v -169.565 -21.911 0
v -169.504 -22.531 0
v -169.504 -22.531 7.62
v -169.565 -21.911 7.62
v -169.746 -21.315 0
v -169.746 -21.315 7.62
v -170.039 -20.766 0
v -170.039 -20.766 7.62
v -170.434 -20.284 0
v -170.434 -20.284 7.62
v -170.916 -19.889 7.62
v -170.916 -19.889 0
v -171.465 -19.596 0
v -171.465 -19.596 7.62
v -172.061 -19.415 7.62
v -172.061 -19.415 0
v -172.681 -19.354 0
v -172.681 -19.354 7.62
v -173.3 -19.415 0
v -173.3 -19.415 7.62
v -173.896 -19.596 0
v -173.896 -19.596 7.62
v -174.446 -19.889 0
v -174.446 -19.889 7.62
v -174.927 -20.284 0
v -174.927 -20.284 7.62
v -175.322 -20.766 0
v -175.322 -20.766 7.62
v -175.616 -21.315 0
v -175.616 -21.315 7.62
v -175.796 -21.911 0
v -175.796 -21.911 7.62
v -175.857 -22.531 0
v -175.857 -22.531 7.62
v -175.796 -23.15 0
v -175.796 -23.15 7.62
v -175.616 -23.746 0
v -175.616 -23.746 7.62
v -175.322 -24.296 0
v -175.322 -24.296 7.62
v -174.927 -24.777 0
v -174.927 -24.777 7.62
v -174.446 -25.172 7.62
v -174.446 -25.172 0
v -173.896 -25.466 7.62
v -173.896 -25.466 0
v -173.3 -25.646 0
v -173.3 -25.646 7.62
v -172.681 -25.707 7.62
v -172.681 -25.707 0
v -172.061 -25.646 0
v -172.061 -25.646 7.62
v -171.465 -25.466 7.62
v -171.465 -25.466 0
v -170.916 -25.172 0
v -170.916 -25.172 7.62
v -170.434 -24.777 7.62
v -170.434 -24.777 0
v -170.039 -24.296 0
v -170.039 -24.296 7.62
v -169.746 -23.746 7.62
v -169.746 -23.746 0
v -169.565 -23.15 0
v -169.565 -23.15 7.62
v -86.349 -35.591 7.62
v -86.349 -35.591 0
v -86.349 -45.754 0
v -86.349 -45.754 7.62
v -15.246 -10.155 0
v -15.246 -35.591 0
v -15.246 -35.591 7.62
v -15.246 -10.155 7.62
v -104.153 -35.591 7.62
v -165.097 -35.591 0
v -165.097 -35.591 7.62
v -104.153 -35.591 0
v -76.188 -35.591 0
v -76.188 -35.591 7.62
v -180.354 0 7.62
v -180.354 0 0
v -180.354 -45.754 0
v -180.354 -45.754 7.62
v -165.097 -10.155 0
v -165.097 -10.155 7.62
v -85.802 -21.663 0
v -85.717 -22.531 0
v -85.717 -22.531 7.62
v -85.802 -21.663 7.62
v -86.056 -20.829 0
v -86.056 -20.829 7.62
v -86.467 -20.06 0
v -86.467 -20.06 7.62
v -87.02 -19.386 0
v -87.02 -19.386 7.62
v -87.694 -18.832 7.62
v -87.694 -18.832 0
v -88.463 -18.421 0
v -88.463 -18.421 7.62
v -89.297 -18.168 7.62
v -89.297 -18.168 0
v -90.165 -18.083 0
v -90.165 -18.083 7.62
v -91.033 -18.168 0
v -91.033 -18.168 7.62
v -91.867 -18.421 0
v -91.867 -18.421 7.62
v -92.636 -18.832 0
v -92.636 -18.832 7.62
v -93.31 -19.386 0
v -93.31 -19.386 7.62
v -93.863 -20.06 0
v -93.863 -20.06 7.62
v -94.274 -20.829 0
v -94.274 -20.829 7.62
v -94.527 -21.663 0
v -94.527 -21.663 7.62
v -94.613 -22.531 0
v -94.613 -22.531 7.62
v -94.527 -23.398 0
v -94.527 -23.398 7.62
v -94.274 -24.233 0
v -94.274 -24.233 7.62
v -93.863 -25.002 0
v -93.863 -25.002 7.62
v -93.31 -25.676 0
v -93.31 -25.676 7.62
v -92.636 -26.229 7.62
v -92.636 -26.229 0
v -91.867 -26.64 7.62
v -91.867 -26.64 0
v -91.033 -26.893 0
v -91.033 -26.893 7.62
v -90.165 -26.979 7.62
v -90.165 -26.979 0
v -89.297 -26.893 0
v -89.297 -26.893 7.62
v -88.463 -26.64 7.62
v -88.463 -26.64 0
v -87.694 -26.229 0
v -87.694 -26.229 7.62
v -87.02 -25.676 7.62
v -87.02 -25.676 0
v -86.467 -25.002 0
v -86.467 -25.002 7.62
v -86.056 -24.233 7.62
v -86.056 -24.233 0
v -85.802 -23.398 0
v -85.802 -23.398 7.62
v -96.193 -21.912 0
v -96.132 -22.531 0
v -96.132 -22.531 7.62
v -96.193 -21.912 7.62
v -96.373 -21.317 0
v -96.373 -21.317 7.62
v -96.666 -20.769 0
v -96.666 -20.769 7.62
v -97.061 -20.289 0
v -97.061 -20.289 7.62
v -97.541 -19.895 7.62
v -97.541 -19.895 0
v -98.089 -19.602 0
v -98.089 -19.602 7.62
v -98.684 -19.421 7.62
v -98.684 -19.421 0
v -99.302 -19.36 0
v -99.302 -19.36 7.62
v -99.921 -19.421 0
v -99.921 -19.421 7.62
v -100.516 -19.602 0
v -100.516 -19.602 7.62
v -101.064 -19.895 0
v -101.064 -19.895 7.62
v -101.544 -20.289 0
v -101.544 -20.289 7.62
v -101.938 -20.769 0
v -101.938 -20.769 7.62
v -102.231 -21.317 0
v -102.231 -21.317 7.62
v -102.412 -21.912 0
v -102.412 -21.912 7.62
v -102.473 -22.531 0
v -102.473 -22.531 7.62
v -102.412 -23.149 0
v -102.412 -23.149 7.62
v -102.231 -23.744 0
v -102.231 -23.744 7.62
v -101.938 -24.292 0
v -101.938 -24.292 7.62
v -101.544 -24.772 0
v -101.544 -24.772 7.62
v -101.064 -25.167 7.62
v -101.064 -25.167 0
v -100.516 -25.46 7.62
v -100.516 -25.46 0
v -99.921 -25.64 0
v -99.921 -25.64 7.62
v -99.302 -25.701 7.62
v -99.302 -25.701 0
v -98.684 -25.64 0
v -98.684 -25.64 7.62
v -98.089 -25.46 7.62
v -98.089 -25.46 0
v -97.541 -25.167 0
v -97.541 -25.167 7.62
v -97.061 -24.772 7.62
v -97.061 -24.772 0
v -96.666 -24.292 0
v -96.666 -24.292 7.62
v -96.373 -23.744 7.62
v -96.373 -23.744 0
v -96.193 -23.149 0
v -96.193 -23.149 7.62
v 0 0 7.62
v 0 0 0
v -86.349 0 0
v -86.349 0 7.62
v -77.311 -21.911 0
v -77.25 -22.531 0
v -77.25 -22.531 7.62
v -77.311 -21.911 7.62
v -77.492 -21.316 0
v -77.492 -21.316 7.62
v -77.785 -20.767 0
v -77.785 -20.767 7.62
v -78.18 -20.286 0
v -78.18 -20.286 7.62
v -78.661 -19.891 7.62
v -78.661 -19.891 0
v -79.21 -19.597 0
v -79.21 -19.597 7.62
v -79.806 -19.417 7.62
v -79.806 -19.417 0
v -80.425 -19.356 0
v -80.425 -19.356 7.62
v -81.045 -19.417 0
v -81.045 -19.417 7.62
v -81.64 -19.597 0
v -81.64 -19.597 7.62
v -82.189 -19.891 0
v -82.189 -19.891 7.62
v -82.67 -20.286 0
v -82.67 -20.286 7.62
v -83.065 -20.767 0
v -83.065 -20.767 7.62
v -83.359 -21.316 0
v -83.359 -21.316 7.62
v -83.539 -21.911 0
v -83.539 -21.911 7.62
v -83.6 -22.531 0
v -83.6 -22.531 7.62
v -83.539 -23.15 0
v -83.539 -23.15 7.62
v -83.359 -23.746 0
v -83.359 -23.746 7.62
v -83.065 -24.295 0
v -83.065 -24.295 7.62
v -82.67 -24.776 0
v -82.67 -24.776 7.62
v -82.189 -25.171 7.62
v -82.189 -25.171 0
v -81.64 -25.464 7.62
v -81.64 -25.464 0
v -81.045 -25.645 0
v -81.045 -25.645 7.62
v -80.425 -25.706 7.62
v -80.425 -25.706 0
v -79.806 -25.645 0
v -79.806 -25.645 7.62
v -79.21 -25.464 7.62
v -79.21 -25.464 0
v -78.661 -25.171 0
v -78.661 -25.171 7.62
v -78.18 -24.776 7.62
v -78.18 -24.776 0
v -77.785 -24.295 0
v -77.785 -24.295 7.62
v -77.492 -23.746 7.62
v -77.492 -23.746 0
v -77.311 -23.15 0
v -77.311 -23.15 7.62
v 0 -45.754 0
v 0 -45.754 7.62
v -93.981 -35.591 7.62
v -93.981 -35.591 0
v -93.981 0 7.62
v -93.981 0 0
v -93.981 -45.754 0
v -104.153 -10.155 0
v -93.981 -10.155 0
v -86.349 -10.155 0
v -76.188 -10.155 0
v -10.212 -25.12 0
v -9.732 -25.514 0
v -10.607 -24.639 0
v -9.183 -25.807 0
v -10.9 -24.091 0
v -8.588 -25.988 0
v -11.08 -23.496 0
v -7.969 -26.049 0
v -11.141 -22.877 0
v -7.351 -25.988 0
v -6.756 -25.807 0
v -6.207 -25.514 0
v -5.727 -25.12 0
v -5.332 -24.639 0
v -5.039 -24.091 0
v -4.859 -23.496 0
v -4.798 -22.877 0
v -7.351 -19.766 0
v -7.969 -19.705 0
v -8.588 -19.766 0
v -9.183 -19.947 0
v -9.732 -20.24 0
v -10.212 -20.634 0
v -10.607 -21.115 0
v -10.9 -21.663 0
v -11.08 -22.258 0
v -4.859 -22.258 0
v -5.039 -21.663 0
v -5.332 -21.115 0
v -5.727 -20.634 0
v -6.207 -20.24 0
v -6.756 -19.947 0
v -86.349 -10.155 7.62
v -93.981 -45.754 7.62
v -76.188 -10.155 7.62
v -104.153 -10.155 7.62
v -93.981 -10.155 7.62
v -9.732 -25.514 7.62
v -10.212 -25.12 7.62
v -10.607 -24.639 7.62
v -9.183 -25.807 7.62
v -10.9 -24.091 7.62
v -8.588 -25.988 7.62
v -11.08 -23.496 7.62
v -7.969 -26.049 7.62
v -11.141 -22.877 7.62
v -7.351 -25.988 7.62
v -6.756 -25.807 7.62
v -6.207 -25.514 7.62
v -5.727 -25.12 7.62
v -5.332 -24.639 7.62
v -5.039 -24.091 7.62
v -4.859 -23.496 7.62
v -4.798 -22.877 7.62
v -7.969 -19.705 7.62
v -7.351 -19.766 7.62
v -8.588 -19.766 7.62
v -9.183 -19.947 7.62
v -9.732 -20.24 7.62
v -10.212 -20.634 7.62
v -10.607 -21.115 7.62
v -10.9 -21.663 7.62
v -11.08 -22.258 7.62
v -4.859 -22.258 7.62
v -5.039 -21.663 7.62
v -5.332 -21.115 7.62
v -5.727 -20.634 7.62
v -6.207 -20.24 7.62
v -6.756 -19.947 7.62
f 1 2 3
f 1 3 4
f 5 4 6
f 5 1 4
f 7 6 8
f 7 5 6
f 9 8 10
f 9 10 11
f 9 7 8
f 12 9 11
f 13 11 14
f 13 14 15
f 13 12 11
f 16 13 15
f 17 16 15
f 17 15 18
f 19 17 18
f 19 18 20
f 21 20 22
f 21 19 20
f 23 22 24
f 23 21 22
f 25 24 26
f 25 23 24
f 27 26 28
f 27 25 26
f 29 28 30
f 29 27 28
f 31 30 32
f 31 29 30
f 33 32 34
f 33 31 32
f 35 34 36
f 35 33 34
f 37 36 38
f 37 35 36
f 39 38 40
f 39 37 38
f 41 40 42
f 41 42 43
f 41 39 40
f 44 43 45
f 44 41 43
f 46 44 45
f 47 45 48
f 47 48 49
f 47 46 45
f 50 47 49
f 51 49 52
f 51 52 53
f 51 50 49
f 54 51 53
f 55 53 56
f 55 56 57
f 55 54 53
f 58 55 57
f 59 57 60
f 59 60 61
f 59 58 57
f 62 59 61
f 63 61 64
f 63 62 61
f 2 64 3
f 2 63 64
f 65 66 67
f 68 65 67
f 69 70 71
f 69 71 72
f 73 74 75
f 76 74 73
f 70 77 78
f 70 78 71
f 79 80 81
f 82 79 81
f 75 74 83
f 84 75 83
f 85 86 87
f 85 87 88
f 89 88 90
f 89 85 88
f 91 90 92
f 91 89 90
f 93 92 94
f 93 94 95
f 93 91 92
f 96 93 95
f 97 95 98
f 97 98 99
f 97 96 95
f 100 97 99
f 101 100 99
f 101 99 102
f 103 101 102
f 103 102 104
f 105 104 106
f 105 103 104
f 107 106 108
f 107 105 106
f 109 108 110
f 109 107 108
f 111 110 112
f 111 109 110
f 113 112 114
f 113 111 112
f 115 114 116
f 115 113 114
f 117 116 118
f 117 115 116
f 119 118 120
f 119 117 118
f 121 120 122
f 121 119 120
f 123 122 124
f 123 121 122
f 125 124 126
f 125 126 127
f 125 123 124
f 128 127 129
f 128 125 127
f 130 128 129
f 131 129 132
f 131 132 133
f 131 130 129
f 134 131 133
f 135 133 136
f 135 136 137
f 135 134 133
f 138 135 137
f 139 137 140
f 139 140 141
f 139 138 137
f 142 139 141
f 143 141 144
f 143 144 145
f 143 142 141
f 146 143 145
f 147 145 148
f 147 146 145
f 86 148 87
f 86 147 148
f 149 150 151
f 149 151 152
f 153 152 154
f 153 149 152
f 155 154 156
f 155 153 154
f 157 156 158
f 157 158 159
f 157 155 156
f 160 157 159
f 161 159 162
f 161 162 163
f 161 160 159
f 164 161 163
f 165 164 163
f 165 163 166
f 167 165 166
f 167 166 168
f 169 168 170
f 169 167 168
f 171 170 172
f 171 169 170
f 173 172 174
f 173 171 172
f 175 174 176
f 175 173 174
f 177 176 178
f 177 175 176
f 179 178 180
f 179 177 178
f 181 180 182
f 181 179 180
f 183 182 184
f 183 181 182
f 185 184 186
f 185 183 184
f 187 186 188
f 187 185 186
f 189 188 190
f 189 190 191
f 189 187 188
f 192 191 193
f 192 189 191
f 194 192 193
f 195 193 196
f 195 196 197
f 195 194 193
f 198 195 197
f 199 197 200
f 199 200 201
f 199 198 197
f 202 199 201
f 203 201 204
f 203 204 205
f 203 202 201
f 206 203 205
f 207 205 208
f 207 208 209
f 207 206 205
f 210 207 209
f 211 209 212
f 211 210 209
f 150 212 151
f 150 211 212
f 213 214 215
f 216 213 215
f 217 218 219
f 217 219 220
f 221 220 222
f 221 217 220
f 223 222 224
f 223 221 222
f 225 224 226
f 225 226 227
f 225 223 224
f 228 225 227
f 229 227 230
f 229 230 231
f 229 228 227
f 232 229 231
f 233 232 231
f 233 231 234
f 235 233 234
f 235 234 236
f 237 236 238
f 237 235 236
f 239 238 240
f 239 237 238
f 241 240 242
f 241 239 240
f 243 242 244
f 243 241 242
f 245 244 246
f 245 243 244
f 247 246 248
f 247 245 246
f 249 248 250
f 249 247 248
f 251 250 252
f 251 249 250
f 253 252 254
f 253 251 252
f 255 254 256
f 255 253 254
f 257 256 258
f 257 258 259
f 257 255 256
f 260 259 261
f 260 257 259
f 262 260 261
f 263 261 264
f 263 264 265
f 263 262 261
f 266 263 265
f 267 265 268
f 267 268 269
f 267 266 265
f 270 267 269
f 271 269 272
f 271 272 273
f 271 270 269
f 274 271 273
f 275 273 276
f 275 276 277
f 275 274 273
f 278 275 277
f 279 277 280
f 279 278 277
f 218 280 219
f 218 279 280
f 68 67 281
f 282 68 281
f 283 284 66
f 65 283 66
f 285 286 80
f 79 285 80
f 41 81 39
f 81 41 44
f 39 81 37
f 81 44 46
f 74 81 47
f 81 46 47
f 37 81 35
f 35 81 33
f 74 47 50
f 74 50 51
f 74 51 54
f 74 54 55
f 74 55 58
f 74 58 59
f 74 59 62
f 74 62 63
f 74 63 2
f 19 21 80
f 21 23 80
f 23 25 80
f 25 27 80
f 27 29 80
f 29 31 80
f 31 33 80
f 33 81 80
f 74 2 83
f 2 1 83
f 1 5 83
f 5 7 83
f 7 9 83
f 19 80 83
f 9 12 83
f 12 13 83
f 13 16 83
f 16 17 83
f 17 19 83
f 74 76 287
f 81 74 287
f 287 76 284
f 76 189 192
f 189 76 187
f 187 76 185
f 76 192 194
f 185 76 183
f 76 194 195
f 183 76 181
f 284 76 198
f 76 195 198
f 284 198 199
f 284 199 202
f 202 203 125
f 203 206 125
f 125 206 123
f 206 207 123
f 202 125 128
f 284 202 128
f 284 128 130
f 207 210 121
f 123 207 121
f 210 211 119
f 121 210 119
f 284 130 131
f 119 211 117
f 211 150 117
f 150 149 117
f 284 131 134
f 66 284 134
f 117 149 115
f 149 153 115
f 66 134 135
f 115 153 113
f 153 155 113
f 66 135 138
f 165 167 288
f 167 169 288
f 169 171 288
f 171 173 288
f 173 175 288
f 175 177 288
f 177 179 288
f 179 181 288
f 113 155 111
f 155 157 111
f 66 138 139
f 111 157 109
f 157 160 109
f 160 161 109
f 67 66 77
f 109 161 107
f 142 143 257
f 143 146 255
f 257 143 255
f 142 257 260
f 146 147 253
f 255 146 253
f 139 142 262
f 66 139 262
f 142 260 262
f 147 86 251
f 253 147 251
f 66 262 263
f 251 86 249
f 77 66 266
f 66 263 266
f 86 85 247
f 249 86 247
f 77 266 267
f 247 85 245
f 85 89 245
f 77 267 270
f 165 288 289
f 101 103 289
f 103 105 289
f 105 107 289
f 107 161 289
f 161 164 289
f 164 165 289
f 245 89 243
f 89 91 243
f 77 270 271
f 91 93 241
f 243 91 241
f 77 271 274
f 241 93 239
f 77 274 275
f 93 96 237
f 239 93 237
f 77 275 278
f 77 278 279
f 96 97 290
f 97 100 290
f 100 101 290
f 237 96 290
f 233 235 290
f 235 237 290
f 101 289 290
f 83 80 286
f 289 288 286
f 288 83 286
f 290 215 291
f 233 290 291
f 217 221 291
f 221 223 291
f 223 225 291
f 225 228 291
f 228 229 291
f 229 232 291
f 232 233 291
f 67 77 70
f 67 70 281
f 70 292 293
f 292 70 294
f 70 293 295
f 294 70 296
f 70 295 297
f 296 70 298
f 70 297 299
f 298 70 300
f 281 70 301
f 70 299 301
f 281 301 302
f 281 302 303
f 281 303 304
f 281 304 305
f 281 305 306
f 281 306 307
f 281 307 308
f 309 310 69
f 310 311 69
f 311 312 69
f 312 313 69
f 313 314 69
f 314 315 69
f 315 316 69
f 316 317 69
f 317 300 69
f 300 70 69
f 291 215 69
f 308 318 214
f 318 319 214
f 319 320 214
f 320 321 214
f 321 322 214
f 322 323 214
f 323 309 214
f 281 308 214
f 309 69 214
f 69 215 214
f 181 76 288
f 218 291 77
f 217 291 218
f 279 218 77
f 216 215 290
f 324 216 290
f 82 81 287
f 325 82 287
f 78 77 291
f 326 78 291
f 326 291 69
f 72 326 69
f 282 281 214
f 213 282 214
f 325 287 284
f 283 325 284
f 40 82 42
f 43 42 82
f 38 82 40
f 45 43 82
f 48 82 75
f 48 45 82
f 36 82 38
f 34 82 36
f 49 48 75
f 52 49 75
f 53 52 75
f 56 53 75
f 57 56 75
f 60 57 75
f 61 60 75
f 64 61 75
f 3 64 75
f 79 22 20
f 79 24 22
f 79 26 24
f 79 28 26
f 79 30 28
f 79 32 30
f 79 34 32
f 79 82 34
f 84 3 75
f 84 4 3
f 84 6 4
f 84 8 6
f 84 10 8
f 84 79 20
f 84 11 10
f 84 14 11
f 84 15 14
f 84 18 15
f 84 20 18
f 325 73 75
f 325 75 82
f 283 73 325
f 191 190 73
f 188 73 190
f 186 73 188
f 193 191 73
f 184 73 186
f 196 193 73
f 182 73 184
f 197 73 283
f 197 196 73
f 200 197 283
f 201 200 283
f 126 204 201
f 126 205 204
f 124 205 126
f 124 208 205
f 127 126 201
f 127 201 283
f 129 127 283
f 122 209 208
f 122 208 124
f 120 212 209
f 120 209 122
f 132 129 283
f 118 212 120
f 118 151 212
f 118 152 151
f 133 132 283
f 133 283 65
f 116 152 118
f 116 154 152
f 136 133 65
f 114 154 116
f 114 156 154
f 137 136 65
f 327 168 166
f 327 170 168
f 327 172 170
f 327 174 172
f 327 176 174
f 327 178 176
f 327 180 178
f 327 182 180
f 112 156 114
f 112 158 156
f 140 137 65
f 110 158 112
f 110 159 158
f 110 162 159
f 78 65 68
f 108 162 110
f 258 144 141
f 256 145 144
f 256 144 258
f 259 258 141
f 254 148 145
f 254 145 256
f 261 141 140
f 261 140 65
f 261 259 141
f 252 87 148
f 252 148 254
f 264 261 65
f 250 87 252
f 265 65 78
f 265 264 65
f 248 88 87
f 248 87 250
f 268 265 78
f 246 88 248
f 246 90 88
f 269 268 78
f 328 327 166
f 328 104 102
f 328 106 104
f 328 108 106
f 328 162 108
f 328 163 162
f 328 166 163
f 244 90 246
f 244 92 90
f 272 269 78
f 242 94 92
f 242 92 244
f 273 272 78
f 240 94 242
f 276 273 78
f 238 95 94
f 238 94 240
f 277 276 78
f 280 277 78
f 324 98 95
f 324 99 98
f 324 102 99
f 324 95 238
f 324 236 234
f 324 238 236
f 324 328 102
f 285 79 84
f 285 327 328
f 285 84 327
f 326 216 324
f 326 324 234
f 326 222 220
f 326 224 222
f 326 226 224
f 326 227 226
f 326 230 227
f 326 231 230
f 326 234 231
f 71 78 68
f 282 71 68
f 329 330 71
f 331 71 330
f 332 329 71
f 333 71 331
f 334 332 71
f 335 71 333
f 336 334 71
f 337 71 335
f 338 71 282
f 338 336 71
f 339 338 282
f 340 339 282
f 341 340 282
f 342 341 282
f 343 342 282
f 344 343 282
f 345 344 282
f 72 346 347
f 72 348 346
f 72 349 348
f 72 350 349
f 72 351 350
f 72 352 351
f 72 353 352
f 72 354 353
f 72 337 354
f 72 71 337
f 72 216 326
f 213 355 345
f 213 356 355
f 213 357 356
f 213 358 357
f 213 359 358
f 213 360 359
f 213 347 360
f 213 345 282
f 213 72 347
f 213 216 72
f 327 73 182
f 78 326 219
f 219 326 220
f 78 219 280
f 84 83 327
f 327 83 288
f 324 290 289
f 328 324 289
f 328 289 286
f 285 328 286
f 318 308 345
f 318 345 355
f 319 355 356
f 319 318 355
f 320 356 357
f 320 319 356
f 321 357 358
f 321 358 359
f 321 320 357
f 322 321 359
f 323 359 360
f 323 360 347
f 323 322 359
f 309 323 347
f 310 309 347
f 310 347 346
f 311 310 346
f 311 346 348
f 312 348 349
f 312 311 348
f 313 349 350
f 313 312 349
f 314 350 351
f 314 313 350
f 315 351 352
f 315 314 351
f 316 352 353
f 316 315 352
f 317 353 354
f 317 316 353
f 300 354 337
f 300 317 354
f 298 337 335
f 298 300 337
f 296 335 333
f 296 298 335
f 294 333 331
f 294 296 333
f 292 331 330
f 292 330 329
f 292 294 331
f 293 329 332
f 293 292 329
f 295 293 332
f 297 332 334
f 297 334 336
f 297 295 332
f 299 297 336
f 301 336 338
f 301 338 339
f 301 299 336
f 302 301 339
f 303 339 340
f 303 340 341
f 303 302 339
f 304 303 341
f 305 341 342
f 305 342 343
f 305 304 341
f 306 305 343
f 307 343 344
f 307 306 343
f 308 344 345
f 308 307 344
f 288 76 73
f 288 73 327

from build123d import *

# Parameters (mm, degrees)
F0_R     = 3.176712
F0_W     = 60.944215
F0_H     = 25.435724
F0_R_2   = 3.170316
F0_R_3   = 4.447947
F0_R_4   = 3.175147
F0_W_2   = 60.941307
F0_R_5   = 3.171767
F1_DEPTH = 7.62


with BuildPart() as f1:
    # F0 (on Top) → F1 (new body)
    with BuildSketch(Plane.XY):
        Polygon((0, -10.154884), (0, 0), (-10.158613, 0), (-15.246199, 0), (-44.828615, 0), (-76.187506, 0), (-86.349189, 0), (-86.349189, -10.154884), (-93.980744, -10.154884), (-93.980744, 0), (-104.15256, 0), (-165.096775, 0), (-170.221075, 0), (-180.353627, 0), (-180.353627, -10.154884), (-180.353627, -35.590608), (-180.353627, -45.754101), (-170.221075, -45.754101), (-165.096775, -45.754101), (-93.980744, -45.754101), (-93.980744, -35.590608), (-86.349189, -35.590608), (-86.349189, -45.754101), (-76.187506, -45.754101), (-15.246199, -45.754101), (-10.158613, -45.754101), (0, -45.754101), (0, -35.590608), align=None)
        with Locations((-172.680676, -22.530714)):
            Circle(F0_R, mode=Mode.SUBTRACT)
        with Locations((-134.624667, -22.872746)):
            Rectangle(F0_W, F0_H, mode=Mode.SUBTRACT)
        with Locations((-99.302329, -22.530714)):
            Circle(F0_R_2, mode=Mode.SUBTRACT)
        with Locations((-90.164967, -22.530714)):
            Circle(F0_R_3, mode=Mode.SUBTRACT)
        with Locations((-80.425173, -22.530714)):
            Circle(F0_R_4, mode=Mode.SUBTRACT)
        with Locations((-45.716853, -22.872746)):
            Rectangle(F0_W_2, F0_H, mode=Mode.SUBTRACT)
        with Locations((-7.969475, -22.877051)):
            Circle(F0_R_5, mode=Mode.SUBTRACT)
    extrude(amount=F1_DEPTH)


solid = f1.part
